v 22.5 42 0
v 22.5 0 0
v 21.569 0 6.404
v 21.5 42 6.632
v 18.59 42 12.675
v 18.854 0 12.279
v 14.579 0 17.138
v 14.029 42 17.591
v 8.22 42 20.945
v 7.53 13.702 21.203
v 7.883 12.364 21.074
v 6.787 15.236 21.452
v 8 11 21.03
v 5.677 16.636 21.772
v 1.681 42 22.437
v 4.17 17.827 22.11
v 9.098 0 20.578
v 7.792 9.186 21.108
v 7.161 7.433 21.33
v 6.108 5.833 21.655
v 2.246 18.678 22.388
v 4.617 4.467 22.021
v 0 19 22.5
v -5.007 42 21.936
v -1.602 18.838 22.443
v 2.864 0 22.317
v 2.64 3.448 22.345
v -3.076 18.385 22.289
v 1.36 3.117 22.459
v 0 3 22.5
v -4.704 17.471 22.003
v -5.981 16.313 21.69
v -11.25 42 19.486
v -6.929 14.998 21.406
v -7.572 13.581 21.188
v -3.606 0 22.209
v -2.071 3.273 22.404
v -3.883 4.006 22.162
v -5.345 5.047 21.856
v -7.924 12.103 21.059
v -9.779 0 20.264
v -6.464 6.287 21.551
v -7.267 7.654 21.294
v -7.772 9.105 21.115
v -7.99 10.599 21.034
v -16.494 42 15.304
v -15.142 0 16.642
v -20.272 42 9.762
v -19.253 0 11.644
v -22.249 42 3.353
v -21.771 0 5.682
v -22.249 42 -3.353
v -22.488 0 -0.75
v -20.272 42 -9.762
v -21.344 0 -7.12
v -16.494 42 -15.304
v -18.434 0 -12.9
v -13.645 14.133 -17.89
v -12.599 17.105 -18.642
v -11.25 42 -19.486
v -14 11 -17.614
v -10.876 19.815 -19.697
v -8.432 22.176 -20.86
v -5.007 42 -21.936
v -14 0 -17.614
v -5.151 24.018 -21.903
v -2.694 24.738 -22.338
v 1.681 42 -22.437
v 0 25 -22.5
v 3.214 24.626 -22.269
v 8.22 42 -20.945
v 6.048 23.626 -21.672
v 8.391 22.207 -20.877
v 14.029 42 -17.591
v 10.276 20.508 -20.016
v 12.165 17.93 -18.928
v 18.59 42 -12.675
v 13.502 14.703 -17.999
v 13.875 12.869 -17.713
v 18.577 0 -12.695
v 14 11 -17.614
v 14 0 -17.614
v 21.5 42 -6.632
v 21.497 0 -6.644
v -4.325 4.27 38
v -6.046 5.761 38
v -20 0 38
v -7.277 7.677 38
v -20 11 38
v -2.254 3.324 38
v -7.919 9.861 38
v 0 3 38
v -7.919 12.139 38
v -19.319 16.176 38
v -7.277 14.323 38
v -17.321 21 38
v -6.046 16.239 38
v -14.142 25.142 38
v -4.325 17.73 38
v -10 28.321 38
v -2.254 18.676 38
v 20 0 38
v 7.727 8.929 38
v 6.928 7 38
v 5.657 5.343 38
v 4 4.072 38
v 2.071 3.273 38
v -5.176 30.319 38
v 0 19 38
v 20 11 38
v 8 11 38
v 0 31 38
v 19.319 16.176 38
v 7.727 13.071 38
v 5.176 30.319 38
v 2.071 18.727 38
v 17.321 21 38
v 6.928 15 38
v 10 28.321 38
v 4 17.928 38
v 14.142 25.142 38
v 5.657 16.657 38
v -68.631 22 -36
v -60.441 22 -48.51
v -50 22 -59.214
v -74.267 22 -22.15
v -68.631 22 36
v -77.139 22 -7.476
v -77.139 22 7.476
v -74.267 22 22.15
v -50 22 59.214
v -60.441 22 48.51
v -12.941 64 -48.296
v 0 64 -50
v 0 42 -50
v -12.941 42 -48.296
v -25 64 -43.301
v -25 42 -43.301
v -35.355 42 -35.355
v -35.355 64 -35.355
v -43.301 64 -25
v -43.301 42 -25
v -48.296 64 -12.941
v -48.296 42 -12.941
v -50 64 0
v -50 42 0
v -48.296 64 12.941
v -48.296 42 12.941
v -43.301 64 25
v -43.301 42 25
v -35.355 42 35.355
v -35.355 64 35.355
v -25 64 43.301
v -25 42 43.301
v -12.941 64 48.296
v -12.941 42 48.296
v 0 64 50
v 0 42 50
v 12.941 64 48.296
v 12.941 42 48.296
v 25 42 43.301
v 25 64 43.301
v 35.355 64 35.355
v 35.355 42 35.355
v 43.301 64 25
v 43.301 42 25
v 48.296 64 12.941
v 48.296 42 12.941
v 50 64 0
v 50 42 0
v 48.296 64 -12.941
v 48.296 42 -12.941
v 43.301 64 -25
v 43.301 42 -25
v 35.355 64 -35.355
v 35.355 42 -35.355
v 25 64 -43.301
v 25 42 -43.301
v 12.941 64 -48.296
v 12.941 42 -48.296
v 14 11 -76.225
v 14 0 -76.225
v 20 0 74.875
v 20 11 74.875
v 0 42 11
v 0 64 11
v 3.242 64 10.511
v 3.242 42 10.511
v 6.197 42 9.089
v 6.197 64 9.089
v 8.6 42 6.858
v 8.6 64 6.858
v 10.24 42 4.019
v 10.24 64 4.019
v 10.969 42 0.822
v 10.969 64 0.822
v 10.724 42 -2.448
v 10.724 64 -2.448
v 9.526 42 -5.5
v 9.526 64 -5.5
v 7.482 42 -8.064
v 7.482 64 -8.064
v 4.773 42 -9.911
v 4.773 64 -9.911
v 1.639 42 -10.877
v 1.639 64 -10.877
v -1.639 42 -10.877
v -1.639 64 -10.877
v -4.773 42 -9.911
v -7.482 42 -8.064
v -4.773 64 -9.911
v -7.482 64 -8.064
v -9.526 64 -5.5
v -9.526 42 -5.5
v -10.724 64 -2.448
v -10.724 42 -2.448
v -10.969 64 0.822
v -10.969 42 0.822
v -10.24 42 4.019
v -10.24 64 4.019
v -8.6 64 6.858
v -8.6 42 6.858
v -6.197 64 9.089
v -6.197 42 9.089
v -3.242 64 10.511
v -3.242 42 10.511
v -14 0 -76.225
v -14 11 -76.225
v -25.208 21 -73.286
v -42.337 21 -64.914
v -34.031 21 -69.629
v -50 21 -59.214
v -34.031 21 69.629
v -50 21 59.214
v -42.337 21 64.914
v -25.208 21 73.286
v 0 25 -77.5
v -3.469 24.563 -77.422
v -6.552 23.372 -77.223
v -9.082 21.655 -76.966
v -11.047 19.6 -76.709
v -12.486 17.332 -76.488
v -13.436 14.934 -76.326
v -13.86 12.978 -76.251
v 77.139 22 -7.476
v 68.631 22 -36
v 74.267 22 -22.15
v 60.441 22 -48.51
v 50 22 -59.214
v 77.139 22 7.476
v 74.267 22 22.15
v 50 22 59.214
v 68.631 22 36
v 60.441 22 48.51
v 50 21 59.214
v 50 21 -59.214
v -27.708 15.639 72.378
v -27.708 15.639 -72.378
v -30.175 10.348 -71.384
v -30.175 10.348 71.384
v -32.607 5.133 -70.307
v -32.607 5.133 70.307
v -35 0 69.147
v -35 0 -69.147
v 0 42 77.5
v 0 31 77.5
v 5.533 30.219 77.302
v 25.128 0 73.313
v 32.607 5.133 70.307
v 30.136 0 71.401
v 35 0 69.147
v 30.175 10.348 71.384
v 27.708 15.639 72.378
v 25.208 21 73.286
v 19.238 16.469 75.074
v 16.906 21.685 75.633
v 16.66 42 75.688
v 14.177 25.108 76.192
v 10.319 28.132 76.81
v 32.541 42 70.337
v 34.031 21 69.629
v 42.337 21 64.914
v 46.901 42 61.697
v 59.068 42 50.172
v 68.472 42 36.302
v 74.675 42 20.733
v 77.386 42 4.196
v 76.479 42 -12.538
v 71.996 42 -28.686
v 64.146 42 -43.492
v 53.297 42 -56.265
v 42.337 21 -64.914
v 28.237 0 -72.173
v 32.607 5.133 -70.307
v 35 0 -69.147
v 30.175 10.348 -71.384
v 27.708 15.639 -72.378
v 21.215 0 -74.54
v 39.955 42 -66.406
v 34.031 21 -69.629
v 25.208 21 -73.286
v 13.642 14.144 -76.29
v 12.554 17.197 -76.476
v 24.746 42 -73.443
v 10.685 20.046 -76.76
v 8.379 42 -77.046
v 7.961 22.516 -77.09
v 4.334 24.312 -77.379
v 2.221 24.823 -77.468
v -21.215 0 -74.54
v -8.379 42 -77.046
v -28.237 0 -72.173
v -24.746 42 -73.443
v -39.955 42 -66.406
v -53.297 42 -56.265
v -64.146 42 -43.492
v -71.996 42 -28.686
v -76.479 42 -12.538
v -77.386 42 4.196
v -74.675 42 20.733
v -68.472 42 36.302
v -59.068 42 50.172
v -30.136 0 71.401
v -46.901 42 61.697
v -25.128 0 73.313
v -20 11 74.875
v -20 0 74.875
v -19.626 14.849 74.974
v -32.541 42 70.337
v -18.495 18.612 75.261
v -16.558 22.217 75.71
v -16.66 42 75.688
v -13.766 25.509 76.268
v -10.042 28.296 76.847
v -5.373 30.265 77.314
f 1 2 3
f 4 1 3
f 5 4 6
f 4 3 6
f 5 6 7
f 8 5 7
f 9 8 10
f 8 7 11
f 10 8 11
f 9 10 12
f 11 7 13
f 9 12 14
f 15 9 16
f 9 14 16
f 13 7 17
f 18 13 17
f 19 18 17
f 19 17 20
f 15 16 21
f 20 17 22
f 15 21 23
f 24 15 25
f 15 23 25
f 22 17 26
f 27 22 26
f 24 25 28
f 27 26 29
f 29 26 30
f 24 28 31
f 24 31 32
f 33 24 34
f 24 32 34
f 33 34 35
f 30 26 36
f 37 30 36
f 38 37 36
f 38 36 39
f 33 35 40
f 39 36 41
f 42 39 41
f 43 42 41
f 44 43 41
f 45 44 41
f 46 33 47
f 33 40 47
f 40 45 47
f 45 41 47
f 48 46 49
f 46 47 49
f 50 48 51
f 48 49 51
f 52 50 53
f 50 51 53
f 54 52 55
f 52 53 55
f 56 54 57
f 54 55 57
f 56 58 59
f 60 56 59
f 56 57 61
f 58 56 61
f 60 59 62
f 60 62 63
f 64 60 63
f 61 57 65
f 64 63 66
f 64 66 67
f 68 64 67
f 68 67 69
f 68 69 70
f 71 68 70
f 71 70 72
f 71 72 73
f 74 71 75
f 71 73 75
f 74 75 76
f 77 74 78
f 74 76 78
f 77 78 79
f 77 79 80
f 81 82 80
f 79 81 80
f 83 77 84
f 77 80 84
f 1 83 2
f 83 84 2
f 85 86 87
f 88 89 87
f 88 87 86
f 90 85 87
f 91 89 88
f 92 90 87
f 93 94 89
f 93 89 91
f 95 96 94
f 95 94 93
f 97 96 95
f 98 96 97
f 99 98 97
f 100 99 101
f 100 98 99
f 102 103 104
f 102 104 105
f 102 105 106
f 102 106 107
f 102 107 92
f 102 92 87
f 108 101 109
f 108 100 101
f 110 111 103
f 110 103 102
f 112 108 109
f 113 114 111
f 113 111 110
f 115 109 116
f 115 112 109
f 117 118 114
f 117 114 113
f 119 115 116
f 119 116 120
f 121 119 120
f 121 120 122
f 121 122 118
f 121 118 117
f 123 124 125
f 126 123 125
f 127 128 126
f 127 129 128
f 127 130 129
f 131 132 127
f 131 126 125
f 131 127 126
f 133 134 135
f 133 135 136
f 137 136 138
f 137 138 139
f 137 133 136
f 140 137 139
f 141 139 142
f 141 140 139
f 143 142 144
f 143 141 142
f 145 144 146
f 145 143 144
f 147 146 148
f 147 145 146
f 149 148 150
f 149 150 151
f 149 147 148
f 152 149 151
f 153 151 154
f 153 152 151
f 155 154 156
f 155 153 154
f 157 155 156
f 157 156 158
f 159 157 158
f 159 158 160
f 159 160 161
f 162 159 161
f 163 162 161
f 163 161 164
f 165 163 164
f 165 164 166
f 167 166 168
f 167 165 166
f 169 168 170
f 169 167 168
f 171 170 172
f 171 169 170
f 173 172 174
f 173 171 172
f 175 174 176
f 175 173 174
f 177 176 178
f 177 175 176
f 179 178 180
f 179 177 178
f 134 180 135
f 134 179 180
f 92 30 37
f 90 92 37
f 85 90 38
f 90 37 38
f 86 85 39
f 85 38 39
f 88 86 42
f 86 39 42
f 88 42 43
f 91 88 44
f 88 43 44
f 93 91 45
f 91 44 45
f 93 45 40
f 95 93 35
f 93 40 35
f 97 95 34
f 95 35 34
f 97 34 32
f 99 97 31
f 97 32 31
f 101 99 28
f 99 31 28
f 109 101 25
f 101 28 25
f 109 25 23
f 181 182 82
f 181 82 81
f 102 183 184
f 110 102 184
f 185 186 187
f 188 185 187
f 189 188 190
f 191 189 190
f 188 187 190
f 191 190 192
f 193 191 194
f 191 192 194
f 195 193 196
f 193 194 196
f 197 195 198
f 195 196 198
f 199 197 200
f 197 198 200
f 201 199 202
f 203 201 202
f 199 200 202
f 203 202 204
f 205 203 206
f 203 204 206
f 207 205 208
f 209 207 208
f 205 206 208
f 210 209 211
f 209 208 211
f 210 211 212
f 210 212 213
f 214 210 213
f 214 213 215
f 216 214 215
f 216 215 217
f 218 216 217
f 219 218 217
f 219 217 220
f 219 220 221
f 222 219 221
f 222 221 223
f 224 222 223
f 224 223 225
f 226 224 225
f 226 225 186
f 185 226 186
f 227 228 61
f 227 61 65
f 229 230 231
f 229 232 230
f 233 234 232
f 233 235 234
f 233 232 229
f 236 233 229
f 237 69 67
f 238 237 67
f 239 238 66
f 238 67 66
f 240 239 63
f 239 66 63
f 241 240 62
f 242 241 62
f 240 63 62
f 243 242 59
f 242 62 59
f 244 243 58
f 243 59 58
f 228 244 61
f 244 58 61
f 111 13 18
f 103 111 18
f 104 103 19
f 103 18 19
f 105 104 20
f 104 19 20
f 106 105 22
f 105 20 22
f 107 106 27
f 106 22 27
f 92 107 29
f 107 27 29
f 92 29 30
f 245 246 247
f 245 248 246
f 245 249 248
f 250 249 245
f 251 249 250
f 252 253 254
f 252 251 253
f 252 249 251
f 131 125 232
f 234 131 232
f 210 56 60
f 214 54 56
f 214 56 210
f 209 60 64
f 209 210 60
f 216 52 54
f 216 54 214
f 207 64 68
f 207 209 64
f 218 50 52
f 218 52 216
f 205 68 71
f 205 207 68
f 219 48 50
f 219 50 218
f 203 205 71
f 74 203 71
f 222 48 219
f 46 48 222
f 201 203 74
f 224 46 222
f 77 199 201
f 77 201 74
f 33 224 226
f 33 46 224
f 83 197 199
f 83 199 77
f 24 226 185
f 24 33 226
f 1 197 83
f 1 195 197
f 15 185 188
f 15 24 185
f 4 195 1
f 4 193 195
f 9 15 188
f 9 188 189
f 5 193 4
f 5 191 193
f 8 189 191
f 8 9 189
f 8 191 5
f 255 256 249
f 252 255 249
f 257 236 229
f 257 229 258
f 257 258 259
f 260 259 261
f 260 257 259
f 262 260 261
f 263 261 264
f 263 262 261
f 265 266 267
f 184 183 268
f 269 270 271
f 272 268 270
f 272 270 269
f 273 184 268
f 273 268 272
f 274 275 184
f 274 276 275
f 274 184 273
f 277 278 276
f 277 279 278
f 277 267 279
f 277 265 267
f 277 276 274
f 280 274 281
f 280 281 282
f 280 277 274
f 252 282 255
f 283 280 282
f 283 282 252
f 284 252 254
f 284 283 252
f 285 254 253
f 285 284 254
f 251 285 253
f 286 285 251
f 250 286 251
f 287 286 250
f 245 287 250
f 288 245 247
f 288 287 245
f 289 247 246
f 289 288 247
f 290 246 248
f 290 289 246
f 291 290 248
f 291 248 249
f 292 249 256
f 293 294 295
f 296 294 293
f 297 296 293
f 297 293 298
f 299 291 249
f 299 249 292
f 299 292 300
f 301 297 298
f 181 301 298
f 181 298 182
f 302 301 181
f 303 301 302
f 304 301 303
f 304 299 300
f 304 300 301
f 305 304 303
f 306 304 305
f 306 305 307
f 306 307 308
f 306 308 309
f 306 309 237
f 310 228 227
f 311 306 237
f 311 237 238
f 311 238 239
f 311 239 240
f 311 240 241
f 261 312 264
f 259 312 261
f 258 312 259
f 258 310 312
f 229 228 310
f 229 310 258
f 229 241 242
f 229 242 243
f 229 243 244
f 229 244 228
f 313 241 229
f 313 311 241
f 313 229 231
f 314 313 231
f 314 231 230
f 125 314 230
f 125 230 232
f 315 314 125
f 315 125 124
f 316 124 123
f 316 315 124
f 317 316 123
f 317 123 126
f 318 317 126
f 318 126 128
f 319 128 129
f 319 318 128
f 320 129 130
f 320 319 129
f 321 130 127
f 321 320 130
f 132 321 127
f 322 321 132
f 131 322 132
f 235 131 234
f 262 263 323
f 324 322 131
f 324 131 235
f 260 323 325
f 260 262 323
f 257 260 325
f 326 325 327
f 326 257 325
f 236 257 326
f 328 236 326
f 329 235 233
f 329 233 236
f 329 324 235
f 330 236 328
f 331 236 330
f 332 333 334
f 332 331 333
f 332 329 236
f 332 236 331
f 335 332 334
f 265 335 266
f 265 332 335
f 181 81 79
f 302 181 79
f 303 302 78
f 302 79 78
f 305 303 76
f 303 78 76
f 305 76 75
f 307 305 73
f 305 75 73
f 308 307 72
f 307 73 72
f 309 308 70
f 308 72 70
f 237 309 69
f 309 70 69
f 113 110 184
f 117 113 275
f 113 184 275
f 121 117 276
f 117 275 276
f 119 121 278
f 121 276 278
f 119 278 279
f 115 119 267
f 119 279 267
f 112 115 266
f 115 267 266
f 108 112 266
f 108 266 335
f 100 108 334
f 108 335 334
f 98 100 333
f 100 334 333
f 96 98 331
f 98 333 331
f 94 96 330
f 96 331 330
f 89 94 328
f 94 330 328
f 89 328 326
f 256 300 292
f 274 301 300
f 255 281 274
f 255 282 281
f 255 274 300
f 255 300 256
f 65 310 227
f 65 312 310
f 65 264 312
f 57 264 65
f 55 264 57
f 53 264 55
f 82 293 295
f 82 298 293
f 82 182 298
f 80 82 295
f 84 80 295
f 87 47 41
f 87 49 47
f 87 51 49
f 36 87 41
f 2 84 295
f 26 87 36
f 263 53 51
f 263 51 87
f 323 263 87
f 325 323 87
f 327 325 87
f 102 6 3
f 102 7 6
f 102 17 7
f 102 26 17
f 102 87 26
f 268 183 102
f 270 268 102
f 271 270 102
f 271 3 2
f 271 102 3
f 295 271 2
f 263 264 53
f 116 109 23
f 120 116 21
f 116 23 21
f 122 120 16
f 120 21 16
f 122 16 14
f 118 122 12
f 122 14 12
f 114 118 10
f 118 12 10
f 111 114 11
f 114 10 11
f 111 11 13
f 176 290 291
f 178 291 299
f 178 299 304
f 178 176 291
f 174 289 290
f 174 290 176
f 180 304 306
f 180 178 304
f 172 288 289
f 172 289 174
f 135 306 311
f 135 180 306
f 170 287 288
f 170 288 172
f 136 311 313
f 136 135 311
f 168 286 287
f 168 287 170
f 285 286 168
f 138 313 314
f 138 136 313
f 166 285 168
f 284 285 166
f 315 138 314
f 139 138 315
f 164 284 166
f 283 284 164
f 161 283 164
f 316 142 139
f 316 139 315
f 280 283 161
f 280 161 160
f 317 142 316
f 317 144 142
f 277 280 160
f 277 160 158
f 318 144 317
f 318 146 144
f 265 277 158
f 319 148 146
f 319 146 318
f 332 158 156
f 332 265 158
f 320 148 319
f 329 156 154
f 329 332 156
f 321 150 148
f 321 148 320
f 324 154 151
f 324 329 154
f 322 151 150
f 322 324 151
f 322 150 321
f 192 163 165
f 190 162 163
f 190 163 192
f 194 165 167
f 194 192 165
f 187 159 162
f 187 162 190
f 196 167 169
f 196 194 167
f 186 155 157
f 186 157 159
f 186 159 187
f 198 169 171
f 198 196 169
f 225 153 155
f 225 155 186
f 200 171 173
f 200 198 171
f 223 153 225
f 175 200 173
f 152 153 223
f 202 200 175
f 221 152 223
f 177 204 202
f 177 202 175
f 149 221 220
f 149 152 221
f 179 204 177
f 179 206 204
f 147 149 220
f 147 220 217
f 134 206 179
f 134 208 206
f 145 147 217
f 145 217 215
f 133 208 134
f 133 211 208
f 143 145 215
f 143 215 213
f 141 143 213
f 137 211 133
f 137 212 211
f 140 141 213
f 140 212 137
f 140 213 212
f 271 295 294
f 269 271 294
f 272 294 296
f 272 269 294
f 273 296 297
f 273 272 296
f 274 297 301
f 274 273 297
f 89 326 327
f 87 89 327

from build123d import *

# Parameters (mm, degrees)
SKETCH1_R           = 8
BOSS_EXTRUDE1_DEPTH = 77.5
SKETCH1_3_W         = 50
SKETCH1_3_H         = 22
CUT_EXTRUDE1_START  = 38
SKETCH1_4_R         = 8
CUT_EXTRUDE1_DEPTH  = 39.5
CUT_EXTRUDE2_START  = -77.5
SKETCH1_5_R         = 8
CUT_EXTRUDE2_DEPTH  = 77.5
SKETCH2_OUTSIDE_W   = 202.67
SKETCH2_OUTSIDE_H   = 202.67
SKETCH2_OUTSIDE_R   = 77.5
CUT_EXTRUDE4_DEPTH  = 77.5
SKETCH4_R           = 11
CUT_EXTRUDE5_DEPTH  = 77.5
SKETCH5_R           = 22.5
CUT_EXTRUDE6_DEPTH  = 42


with BuildPart() as part:
    # Sketch1 → Boss-Extrude1 (new, symmetric)
    with BuildSketch(Plane.XY):
        Polygon((35, 0), (25.207539179, 21), (50, 21), (50, 22), (77.5, 22), (77.5, 42), (-77.5, 42), (-77.5, 22), (-50, 22), (-50, 21), (-25.207539179, 21), (-35, 0), align=None)
        with Locations((0, 11)):
            Circle(SKETCH1_R, mode=Mode.SUBTRACT)
    extrude(amount=BOSS_EXTRUDE1_DEPTH, both=True)

    # Sketch1<3> → Revolve1 (revolve)
    with BuildSketch(Plane.XY):
        with Locations((-25, 53)):
            Rectangle(SKETCH1_3_W, SKETCH1_3_H)
    revolve(axis=Axis((0, 0, 0), (0, 1, 0)))

    # Sketch1<4> → Cut-Extrude1 (cut)
    with BuildSketch(Plane.XY.offset(CUT_EXTRUDE1_START)):
        with BuildLine():
            Line((20, 0), (20, 11))
            ThreePointArc((20, 11), (0, 31), (-20, 11))
            Line((-20, 11), (-20, 0))
            Line((-20, 0), (20, 0))
        make_face()
        with Locations((0, 11)):
            Circle(SKETCH1_4_R, mode=Mode.SUBTRACT)
    extrude(amount=CUT_EXTRUDE1_DEPTH, mode=Mode.SUBTRACT)

    # Sketch1<5> → Cut-Extrude2 (cut)
    with BuildSketch(Plane.XY.offset(CUT_EXTRUDE2_START)):
        with BuildLine():
            Line((14, 0), (14, 11))
            ThreePointArc((14, 11), (0, 25), (-14, 11))
            Line((-14, 11), (-14, 0))
            Line((-14, 0), (14, 0))
        make_face()
        with Locations((0, 11)):
            Circle(SKETCH1_5_R, mode=Mode.SUBTRACT)
    extrude(amount=CUT_EXTRUDE2_DEPTH, mode=Mode.SUBTRACT)

    # Sketch2 outside → Cut-Extrude4 (cut)
    with BuildSketch(Plane(origin=(0, 64, 0), x_dir=(1, 0, 0), z_dir=(0, 1, 0))):
        Rectangle(SKETCH2_OUTSIDE_W, SKETCH2_OUTSIDE_H)
        Circle(SKETCH2_OUTSIDE_R, mode=Mode.SUBTRACT)
    extrude(amount=-CUT_EXTRUDE4_DEPTH, mode=Mode.SUBTRACT)

    # Sketch4 → Cut-Extrude5 (cut)
    with BuildSketch(Plane(origin=(0, 64, 0), x_dir=(1, 0, 0), z_dir=(0, 1, 0))):
        Circle(SKETCH4_R)
    extrude(amount=-CUT_EXTRUDE5_DEPTH, mode=Mode.SUBTRACT)

    # Sketch5 → Cut-Extrude6 (cut)
    with BuildSketch(Plane.XZ):
        Circle(SKETCH5_R)
    extrude(amount=-CUT_EXTRUDE6_DEPTH, mode=Mode.SUBTRACT)


solid = part.part
